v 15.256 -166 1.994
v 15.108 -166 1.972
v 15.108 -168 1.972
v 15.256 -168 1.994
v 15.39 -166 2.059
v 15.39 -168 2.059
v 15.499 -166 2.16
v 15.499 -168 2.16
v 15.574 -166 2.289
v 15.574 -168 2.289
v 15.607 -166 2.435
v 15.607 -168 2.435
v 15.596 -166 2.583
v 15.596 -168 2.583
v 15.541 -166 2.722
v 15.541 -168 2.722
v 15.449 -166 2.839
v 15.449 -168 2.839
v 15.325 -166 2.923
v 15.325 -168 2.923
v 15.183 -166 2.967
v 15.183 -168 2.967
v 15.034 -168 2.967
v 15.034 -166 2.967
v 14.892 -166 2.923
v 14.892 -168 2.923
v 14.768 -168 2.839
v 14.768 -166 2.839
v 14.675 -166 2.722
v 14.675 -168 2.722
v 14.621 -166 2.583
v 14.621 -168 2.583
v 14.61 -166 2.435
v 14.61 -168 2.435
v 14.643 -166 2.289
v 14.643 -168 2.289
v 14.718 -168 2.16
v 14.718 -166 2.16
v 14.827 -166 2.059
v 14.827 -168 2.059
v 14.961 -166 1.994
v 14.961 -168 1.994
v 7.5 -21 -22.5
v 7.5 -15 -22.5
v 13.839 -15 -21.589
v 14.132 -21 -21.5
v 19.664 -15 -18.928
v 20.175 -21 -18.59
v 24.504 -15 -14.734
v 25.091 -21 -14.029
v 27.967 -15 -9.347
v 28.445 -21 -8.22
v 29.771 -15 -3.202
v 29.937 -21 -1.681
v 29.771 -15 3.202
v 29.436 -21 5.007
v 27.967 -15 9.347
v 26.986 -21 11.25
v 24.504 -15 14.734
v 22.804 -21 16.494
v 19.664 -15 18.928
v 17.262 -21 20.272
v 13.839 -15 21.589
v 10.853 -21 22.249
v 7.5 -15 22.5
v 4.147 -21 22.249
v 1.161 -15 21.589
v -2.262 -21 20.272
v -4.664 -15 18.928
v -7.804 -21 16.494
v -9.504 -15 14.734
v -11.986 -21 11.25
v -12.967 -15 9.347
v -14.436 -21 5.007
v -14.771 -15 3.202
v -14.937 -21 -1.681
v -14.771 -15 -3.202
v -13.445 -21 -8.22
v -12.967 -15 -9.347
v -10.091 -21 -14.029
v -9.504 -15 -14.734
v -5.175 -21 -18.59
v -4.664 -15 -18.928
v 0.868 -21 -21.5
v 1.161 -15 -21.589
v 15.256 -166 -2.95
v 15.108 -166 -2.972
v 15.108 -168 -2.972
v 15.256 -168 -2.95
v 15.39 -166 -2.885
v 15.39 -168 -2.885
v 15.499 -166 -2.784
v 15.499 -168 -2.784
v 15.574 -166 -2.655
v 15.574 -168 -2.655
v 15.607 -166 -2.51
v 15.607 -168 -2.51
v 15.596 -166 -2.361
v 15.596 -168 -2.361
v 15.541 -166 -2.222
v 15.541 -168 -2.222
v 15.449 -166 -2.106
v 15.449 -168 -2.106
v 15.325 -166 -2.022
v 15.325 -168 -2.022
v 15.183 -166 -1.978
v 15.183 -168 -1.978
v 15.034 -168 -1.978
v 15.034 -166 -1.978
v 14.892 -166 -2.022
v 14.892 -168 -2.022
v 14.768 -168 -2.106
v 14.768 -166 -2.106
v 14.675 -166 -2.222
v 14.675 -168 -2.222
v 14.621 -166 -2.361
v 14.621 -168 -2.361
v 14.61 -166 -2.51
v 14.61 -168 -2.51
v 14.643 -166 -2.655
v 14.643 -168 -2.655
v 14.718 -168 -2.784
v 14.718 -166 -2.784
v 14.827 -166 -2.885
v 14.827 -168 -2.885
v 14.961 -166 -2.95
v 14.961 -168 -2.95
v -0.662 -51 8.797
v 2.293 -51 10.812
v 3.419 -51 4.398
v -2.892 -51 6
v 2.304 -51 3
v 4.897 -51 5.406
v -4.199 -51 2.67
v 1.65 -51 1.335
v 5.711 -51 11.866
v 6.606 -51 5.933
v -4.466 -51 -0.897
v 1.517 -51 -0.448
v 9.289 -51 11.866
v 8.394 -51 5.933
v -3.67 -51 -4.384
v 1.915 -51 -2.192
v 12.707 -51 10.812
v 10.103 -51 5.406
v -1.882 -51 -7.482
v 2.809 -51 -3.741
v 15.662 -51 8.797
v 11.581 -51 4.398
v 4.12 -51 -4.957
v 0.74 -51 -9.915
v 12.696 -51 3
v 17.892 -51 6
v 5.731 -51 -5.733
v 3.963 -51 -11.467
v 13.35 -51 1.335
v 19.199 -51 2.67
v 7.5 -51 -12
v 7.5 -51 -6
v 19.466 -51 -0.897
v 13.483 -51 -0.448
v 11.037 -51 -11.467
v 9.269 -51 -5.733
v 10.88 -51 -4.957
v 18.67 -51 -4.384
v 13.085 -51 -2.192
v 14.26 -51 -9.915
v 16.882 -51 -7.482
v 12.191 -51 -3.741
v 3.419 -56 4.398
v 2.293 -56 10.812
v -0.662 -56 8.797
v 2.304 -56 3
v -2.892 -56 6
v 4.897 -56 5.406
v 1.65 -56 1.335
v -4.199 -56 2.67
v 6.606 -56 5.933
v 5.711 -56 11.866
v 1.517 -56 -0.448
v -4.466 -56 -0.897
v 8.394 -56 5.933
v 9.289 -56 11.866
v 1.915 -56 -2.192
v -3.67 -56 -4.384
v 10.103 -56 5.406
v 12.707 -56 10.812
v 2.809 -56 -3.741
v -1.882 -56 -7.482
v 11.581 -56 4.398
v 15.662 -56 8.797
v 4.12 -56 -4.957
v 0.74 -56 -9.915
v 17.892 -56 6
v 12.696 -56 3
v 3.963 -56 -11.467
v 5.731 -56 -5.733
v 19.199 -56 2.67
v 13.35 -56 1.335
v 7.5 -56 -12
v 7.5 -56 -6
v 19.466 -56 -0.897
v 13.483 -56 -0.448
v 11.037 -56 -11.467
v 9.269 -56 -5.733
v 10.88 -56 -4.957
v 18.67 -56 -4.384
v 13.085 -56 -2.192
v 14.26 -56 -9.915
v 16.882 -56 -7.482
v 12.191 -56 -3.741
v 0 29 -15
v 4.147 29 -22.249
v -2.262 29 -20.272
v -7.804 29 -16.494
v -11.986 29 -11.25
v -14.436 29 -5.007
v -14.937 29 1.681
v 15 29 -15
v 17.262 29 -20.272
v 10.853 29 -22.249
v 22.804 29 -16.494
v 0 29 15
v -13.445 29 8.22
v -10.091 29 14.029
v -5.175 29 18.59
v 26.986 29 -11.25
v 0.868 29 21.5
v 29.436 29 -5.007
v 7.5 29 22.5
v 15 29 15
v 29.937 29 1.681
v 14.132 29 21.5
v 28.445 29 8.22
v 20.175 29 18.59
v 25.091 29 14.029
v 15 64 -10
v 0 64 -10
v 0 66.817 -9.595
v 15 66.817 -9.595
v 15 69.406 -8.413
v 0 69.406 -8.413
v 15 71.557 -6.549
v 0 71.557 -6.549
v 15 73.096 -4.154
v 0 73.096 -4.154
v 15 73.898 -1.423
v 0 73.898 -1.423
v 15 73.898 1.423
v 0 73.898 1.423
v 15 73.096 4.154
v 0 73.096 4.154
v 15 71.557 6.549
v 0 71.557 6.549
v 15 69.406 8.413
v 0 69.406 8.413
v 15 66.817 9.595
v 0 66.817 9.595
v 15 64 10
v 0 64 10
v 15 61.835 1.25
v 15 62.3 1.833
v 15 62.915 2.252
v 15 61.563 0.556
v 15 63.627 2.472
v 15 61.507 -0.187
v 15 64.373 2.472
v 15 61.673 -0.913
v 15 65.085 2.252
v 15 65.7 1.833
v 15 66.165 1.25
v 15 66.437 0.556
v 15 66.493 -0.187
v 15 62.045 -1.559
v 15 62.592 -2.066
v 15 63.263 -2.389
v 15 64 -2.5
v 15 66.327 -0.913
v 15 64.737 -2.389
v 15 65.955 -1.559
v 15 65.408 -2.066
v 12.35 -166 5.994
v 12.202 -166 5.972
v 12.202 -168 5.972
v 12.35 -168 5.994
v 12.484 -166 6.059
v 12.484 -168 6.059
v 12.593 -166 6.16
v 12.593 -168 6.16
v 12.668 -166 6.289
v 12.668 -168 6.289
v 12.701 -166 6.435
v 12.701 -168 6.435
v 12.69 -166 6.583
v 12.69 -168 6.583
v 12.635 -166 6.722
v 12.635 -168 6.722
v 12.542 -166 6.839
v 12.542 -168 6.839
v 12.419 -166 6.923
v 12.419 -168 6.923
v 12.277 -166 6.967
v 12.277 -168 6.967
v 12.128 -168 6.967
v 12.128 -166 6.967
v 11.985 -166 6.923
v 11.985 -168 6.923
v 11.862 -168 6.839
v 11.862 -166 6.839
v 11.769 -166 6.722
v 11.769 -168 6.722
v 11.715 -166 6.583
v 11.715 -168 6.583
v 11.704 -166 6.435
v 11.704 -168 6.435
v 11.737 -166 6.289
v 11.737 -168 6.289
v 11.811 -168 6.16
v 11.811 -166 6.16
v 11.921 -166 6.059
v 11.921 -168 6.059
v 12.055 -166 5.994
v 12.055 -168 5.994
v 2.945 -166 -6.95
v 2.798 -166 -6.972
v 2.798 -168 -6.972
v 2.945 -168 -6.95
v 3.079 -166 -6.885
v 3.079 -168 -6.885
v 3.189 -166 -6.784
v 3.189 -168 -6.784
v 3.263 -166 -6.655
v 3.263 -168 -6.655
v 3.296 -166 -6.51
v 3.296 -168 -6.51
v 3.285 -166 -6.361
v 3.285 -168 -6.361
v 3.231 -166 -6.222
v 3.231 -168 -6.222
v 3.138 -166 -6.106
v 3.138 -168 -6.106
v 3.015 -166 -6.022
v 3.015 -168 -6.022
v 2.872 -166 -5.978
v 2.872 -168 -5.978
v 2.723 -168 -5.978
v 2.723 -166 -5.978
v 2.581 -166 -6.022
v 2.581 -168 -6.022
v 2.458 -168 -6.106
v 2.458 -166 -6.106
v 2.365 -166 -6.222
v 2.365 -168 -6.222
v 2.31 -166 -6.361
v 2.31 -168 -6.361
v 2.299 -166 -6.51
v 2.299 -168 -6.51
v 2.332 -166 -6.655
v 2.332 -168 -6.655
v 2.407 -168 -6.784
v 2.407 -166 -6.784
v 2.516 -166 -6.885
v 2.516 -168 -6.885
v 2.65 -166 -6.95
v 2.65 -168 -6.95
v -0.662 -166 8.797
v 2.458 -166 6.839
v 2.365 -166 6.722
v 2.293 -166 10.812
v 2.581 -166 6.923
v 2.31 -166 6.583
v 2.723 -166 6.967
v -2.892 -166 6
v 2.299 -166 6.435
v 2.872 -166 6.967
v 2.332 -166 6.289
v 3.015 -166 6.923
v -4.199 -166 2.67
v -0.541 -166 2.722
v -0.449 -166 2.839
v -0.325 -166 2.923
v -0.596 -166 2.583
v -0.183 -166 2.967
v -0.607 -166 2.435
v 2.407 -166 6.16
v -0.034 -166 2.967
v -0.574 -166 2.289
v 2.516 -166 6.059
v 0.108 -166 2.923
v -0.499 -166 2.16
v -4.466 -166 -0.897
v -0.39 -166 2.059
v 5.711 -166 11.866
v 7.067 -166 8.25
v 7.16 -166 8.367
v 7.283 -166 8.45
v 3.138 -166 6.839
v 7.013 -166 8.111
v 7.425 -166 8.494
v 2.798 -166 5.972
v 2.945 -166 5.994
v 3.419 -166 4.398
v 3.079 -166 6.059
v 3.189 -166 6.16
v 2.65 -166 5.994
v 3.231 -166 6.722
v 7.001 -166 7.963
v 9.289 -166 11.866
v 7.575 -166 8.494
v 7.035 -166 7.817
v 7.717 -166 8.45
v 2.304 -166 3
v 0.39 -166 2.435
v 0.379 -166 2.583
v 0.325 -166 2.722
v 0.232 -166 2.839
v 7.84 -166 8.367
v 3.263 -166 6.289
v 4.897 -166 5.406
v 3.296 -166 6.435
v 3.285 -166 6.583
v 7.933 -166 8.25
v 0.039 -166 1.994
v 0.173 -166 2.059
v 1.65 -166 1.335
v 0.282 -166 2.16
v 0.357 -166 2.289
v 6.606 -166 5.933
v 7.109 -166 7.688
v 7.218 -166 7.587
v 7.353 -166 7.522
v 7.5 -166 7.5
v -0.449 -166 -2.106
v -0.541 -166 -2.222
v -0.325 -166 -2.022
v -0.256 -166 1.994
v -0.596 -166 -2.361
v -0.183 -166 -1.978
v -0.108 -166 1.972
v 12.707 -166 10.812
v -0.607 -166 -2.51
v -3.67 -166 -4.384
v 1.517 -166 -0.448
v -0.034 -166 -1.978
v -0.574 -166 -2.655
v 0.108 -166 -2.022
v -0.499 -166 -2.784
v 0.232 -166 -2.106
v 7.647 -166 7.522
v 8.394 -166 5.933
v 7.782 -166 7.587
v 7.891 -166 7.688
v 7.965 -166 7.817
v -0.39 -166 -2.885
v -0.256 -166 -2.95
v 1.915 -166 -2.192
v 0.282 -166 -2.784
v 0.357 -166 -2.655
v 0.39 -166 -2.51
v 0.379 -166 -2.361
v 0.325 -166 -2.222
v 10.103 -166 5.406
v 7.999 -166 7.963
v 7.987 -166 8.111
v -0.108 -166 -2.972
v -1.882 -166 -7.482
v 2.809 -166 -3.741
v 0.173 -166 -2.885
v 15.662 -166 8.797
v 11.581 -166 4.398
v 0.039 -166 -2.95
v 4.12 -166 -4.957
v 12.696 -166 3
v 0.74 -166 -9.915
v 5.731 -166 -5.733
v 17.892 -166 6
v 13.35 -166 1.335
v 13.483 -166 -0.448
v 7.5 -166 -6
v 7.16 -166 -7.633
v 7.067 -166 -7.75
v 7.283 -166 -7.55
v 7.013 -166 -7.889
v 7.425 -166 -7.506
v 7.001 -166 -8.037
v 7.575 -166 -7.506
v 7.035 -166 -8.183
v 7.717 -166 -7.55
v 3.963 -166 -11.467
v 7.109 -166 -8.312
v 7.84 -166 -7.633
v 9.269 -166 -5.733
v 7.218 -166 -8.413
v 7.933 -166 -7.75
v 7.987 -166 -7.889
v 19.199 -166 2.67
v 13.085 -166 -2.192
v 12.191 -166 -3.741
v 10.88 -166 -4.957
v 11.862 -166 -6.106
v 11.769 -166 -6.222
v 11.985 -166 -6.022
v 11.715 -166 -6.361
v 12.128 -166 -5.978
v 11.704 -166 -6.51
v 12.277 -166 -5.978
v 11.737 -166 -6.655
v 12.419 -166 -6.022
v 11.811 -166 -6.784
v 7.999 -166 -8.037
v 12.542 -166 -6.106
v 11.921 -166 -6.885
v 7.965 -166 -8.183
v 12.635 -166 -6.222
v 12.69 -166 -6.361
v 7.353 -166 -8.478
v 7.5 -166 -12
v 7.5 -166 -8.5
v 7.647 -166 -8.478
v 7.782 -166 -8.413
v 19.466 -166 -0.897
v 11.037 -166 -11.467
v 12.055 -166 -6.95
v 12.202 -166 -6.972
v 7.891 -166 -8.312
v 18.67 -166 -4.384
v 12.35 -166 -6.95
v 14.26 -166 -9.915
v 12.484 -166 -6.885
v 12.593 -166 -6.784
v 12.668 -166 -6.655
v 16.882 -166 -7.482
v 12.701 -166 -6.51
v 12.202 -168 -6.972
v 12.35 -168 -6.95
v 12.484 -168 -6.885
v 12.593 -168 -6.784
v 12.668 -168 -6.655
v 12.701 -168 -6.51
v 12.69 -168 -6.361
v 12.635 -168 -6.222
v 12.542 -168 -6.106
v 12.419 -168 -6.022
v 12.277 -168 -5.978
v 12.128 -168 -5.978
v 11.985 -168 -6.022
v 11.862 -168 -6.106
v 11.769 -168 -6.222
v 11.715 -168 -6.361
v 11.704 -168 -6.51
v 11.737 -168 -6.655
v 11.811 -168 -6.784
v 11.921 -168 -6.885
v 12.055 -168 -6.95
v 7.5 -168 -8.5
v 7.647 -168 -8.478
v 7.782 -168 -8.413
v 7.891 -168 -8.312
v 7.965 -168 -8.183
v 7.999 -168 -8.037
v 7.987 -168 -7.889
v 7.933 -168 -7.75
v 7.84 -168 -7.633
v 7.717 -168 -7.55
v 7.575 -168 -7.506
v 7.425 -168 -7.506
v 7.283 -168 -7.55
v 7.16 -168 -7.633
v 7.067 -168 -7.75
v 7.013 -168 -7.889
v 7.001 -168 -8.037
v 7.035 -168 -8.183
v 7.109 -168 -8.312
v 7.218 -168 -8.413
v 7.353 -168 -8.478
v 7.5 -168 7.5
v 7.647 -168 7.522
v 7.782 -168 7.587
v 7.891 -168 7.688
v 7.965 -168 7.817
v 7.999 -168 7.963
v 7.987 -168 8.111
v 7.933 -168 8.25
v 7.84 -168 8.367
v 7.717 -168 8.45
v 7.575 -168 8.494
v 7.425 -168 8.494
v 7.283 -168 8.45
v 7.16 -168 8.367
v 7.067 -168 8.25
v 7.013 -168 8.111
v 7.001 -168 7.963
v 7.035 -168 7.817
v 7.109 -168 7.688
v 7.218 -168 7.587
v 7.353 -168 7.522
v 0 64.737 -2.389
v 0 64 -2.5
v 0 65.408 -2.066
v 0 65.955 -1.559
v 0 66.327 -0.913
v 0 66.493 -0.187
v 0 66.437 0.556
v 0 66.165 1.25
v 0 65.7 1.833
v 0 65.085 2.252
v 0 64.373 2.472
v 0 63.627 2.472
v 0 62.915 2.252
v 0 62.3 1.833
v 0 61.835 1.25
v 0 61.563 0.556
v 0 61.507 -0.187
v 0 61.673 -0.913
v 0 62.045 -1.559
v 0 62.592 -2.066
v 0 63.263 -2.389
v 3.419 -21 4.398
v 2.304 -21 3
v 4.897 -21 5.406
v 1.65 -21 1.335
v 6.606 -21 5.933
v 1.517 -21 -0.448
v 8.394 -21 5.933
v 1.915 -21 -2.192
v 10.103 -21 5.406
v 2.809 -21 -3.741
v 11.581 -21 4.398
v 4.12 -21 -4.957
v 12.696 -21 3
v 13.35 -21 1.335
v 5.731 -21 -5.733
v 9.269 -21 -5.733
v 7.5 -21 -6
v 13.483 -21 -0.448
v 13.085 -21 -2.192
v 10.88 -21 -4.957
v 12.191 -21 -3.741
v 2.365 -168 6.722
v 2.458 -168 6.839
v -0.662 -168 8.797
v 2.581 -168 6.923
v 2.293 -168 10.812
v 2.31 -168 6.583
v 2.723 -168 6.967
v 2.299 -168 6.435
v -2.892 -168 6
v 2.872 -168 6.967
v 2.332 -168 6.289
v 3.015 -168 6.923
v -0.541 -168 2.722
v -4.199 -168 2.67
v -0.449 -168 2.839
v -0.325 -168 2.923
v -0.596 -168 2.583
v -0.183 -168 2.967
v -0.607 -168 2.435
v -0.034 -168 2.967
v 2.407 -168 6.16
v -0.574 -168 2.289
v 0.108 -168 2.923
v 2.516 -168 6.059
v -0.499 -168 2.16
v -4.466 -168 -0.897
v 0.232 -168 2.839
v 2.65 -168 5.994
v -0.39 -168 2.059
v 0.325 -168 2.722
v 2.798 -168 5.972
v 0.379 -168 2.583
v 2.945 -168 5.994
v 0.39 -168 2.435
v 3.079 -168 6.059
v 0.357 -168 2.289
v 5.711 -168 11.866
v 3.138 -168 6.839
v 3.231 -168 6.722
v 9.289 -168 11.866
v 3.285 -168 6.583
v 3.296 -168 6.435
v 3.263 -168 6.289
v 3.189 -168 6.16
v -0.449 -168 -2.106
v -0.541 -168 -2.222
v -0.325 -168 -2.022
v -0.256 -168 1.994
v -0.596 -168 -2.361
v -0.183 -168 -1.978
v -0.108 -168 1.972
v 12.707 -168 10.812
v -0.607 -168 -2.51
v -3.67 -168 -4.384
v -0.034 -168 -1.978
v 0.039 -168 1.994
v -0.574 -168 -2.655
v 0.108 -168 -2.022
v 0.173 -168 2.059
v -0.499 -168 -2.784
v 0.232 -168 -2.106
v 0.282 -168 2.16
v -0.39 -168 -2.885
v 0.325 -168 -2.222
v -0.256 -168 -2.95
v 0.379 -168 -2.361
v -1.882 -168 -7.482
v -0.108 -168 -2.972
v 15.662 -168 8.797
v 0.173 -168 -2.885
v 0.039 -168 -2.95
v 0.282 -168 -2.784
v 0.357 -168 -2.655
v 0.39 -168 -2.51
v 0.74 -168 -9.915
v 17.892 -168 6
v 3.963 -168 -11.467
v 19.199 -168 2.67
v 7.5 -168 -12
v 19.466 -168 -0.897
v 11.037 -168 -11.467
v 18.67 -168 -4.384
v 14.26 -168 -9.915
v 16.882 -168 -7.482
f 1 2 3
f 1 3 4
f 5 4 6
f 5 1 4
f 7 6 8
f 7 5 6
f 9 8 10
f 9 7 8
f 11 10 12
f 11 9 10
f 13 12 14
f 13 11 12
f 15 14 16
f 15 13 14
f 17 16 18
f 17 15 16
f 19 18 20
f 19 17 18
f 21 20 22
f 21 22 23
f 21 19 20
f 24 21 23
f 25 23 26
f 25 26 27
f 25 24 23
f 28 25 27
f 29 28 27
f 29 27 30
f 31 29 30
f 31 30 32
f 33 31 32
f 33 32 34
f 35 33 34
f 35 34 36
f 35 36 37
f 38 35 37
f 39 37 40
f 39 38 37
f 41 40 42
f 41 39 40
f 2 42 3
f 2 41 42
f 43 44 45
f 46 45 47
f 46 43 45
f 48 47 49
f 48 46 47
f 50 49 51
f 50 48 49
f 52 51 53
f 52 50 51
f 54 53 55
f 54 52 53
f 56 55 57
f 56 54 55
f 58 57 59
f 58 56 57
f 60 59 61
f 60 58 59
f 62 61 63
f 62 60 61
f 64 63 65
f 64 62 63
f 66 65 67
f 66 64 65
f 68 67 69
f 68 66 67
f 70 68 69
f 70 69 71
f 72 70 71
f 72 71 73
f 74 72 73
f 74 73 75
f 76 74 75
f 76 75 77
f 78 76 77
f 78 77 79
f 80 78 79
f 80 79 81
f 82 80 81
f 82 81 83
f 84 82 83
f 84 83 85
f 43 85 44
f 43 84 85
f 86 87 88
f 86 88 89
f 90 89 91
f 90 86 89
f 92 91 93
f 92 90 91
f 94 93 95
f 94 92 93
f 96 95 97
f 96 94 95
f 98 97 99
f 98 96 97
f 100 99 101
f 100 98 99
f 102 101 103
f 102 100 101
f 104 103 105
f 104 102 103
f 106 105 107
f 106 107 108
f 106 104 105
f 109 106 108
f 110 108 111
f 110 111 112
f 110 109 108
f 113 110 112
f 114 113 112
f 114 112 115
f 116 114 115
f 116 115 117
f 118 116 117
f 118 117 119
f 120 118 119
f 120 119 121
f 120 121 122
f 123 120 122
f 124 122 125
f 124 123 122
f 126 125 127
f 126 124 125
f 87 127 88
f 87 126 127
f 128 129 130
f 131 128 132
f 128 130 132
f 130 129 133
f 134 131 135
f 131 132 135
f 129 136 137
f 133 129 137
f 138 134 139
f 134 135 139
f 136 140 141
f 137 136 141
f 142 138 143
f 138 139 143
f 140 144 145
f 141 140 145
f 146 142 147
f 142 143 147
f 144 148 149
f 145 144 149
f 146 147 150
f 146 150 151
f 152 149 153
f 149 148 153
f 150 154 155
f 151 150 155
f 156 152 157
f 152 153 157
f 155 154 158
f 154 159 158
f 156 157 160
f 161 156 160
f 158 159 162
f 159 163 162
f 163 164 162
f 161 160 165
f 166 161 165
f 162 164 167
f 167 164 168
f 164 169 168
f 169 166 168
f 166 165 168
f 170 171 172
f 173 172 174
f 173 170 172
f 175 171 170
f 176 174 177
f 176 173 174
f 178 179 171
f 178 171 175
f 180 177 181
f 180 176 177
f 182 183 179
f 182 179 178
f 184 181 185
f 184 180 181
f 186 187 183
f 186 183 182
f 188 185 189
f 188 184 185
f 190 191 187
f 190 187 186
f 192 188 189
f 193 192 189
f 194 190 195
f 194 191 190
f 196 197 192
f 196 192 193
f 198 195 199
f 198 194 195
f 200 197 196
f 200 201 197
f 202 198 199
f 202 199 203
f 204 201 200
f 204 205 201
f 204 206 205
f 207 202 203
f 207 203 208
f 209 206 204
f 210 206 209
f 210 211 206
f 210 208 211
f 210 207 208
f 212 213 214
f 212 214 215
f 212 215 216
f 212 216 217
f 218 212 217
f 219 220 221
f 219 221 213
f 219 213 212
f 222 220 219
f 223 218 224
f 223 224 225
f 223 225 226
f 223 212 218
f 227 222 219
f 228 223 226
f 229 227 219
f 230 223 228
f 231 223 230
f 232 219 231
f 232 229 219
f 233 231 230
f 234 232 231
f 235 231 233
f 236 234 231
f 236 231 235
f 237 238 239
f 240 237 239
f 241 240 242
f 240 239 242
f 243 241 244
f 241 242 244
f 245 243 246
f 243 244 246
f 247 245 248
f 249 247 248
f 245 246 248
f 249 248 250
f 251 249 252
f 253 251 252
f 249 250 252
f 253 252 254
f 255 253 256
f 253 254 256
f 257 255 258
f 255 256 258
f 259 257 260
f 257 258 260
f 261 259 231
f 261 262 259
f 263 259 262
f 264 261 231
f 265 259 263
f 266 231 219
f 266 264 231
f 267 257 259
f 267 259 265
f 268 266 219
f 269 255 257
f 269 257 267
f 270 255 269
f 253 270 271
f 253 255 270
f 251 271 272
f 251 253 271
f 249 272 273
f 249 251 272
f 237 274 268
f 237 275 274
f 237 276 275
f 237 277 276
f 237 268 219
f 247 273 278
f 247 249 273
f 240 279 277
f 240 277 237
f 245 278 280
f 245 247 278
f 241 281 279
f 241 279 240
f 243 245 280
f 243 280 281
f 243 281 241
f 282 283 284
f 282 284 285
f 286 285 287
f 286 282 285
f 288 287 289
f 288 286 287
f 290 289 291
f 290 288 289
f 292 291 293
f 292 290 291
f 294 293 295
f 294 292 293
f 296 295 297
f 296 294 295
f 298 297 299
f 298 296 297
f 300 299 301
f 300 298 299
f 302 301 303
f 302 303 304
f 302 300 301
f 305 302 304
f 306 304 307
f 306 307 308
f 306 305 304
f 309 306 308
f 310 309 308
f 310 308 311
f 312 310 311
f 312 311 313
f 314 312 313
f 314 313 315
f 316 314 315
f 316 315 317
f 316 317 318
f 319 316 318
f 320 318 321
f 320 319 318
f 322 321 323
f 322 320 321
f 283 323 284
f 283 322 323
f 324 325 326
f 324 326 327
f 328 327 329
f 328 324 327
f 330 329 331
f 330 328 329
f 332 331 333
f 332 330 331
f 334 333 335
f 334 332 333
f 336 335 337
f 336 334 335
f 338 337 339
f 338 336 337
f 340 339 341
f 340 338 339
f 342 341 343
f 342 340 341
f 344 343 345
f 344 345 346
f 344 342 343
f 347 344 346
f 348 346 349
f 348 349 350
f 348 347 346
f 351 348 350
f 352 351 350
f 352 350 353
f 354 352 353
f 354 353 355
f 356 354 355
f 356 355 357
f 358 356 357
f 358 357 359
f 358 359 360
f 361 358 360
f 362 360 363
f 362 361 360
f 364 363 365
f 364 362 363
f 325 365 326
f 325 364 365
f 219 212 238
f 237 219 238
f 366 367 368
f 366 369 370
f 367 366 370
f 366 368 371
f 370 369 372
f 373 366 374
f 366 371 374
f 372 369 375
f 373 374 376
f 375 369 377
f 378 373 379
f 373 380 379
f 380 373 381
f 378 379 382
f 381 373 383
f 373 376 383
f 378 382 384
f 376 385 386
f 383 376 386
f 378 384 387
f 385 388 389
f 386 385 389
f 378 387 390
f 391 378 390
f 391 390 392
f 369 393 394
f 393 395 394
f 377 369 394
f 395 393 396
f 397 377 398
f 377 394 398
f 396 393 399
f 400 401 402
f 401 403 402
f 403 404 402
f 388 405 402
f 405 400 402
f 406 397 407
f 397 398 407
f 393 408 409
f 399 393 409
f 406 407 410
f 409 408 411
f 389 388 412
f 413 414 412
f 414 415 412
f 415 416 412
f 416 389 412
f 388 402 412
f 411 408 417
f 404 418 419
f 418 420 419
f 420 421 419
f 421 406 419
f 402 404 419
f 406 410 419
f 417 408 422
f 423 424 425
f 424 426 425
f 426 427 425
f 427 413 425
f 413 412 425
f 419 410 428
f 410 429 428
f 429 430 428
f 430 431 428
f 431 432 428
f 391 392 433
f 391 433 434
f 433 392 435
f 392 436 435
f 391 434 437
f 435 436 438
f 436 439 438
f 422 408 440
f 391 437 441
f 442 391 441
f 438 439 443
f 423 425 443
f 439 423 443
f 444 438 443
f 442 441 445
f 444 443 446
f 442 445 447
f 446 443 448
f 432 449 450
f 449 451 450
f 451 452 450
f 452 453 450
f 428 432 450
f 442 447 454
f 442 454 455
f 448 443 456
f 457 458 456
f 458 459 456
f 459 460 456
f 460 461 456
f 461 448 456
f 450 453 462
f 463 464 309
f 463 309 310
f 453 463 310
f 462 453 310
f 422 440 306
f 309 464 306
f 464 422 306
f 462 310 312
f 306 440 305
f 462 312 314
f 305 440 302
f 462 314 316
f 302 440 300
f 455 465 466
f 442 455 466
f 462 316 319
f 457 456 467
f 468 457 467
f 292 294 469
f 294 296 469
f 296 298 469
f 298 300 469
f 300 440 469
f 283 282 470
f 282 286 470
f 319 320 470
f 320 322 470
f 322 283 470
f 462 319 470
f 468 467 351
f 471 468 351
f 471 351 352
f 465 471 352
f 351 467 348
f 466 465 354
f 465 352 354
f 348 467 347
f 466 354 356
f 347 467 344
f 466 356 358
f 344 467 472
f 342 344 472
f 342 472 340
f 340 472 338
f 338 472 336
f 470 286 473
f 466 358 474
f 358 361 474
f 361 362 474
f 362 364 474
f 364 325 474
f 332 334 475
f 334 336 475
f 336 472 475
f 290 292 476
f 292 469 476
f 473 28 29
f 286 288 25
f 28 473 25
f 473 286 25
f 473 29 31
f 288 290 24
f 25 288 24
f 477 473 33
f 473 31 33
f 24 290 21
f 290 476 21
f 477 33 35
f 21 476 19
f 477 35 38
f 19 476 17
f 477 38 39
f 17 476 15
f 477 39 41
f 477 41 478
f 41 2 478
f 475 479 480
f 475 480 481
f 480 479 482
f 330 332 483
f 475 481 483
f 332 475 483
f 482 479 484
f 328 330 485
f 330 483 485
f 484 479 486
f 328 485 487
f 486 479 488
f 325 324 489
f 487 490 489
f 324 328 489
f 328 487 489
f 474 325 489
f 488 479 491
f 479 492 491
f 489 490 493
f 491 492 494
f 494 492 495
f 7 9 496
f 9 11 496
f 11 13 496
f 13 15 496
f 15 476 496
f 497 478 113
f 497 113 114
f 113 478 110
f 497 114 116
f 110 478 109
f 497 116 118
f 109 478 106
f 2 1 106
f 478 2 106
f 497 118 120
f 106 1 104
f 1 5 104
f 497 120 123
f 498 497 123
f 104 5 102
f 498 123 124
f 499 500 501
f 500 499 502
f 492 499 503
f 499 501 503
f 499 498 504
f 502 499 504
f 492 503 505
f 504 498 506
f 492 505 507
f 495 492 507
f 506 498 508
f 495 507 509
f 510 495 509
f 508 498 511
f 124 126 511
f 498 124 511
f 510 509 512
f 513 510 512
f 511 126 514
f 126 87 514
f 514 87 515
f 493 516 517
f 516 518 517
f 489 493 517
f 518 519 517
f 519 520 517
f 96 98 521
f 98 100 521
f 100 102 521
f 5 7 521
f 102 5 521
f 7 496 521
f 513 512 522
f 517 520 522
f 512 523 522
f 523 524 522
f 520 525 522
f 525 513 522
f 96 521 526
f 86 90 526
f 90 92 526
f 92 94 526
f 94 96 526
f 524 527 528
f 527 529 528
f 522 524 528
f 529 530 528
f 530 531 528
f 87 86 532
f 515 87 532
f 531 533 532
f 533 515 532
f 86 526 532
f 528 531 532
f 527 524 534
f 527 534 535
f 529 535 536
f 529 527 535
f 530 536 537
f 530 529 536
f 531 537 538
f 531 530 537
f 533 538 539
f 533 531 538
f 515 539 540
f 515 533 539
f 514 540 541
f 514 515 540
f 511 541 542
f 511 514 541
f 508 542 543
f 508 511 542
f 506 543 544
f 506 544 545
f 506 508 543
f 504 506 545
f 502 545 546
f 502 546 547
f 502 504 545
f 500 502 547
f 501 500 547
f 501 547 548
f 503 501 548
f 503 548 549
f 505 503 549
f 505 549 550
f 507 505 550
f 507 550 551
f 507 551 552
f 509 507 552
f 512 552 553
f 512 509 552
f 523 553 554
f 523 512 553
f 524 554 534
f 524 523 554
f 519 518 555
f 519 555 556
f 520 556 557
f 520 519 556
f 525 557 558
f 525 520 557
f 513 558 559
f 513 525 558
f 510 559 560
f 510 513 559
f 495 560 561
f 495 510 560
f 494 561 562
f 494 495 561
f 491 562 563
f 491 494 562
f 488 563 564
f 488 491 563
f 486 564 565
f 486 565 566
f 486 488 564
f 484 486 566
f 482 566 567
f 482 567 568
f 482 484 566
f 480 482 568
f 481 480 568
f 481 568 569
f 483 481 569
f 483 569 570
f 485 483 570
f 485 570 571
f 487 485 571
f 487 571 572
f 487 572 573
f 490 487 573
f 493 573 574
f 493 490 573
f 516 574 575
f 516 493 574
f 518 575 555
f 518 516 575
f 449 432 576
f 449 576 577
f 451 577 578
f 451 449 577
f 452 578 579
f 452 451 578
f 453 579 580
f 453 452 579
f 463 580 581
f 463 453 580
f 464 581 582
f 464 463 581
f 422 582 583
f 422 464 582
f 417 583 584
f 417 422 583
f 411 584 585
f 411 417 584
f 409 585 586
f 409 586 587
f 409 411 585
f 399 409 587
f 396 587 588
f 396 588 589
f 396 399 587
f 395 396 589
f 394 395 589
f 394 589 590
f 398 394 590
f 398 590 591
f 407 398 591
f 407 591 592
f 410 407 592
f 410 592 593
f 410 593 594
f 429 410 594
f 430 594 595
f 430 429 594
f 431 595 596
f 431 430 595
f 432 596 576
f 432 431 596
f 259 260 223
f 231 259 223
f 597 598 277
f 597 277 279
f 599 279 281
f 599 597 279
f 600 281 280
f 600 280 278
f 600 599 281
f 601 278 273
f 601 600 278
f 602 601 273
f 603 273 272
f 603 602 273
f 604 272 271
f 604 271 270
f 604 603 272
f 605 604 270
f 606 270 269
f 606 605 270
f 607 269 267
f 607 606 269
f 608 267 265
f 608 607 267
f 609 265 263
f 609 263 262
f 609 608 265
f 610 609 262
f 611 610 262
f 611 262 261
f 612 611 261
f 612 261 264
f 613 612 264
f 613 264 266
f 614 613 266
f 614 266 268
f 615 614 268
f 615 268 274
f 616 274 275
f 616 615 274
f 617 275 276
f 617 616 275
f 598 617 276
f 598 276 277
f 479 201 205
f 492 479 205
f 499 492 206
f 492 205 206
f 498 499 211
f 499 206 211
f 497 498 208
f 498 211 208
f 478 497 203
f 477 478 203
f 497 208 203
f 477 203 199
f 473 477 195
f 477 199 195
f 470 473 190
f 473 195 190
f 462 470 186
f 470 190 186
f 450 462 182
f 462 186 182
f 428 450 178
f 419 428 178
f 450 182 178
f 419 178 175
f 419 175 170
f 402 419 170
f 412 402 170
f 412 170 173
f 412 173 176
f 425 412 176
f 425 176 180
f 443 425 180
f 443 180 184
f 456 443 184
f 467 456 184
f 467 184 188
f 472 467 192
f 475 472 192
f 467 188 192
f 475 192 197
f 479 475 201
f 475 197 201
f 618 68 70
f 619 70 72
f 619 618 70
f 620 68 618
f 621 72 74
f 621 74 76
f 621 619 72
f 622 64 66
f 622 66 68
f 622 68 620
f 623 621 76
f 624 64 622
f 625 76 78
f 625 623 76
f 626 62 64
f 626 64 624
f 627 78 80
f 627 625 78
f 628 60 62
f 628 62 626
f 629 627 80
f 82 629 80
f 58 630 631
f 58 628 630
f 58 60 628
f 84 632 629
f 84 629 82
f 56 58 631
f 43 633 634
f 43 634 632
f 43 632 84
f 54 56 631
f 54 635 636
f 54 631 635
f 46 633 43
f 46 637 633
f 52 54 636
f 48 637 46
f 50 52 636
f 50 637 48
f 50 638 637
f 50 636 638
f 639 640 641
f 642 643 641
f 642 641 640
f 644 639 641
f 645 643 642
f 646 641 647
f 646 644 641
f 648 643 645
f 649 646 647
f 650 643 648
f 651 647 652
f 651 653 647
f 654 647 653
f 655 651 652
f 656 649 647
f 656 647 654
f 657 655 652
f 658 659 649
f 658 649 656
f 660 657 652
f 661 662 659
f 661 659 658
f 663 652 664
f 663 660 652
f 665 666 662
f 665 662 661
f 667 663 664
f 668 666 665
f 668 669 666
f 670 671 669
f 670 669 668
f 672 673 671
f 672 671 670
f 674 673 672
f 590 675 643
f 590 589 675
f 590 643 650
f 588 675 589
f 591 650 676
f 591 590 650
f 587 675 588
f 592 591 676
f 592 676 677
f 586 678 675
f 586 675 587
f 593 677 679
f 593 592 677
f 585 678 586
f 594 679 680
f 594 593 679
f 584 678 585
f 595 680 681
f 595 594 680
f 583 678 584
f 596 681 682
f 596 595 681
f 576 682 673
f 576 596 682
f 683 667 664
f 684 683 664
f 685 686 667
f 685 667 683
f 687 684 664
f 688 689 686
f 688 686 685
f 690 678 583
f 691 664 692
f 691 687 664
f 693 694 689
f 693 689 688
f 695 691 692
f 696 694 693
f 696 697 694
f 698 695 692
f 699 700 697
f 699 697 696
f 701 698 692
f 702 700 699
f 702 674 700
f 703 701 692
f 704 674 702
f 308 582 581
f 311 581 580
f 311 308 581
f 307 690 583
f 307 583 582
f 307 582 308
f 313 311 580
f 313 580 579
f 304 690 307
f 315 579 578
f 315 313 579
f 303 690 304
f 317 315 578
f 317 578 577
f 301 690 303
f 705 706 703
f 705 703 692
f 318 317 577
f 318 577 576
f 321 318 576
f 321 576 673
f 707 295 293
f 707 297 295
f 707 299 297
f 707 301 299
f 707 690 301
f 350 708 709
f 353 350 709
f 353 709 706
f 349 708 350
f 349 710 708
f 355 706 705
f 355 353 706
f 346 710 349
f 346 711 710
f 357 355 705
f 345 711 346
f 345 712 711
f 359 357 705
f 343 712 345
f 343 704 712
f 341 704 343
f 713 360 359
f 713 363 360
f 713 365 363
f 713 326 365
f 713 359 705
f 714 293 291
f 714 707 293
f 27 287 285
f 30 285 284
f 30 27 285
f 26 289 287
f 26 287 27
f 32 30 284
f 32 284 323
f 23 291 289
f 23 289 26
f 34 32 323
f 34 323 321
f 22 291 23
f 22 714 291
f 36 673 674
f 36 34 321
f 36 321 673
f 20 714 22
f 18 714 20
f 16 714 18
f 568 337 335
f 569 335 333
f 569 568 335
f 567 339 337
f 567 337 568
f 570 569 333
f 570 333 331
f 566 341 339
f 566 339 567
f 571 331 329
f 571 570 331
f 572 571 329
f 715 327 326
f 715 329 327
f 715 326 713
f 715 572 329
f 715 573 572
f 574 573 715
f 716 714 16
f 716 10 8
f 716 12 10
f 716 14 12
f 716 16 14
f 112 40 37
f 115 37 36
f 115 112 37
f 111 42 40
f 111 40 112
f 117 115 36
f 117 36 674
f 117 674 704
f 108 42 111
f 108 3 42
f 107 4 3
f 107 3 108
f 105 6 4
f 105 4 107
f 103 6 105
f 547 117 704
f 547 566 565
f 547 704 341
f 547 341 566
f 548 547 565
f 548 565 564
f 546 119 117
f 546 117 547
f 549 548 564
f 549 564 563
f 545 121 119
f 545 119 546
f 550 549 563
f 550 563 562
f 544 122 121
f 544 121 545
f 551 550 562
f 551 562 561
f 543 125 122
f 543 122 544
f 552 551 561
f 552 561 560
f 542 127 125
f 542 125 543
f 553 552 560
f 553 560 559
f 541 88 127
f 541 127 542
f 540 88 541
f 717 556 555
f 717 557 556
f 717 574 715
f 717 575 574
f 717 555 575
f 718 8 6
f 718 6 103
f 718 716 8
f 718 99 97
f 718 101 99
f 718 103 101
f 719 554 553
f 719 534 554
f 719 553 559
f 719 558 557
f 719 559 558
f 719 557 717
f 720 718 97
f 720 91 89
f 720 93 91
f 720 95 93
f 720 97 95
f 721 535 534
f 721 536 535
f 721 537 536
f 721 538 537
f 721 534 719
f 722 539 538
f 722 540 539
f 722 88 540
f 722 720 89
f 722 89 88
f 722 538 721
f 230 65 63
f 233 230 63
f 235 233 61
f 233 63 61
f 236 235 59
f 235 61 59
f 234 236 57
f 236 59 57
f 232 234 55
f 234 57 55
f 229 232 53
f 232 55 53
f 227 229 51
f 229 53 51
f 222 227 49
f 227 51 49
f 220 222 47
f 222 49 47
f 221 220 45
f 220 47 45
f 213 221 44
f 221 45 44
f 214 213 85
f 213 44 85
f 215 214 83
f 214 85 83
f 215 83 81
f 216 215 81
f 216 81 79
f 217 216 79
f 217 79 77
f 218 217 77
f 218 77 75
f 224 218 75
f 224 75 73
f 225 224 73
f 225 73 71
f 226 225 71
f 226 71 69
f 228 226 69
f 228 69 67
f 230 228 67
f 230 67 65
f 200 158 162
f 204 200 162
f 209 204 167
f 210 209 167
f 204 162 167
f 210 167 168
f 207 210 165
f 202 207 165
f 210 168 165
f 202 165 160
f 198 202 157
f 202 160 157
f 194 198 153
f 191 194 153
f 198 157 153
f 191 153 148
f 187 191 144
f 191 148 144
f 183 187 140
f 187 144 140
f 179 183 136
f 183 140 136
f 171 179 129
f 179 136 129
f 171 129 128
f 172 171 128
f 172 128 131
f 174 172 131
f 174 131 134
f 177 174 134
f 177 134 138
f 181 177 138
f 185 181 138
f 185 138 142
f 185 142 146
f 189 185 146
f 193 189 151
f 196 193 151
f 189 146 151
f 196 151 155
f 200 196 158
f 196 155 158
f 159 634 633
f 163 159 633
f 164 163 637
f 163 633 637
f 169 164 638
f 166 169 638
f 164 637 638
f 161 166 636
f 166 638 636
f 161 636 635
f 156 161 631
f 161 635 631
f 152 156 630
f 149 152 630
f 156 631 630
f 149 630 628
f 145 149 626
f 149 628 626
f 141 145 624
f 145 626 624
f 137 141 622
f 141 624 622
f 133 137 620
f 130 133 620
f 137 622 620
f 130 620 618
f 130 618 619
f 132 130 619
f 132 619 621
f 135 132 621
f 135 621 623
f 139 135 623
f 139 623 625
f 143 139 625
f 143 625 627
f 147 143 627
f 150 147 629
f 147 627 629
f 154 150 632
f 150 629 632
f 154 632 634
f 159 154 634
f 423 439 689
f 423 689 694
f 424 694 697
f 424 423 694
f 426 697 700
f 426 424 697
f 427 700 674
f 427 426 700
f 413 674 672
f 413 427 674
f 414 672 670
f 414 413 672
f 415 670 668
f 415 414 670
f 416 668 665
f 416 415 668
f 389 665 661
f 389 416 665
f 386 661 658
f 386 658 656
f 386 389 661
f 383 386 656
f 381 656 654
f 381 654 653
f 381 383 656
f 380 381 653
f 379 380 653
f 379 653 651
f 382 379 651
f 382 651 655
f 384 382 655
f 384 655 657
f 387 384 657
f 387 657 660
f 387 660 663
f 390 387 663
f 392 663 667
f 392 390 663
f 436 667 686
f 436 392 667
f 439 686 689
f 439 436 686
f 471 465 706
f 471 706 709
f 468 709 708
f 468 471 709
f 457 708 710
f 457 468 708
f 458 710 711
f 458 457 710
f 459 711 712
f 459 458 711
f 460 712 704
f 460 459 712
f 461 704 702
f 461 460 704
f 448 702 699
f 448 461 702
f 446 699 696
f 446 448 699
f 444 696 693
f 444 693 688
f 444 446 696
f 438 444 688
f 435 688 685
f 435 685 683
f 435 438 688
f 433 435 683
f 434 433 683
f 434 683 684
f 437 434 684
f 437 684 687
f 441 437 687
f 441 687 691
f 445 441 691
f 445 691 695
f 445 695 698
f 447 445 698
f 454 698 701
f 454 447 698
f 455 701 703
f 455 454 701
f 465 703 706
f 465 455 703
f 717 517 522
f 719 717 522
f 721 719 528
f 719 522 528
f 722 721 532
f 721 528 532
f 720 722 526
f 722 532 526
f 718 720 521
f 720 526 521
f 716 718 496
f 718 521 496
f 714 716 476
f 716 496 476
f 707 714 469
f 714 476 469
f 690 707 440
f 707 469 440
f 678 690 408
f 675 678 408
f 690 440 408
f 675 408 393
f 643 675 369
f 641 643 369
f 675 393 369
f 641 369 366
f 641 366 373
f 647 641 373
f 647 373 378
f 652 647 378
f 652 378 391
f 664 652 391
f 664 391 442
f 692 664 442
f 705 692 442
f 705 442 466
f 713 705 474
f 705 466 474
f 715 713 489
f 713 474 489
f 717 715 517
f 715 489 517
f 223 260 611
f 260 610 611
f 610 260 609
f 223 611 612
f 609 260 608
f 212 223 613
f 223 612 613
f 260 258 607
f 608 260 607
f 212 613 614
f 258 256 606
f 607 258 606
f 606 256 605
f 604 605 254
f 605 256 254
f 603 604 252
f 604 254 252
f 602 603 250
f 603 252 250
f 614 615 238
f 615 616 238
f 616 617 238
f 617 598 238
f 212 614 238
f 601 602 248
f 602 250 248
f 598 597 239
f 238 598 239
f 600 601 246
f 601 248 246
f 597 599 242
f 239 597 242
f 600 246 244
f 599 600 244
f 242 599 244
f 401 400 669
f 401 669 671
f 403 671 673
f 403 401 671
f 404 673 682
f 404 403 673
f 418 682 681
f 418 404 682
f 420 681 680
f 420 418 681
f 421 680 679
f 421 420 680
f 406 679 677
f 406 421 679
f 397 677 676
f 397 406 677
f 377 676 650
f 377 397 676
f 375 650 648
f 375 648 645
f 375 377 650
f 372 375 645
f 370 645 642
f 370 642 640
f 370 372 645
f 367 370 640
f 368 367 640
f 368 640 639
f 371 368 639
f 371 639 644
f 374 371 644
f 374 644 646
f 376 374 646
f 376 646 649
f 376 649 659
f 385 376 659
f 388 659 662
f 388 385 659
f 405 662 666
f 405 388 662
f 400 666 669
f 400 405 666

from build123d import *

# Parameters (mm, degrees)
SKETCH2_R            = 2.5
BOSS_EXTRUDE2_DEPTH  = 15
SKETCH3_R            = 22.5
BOSS_EXTRUDE16_DEPTH = 39
BOSS_EXTRUDE22_START = -5
SKETCH3_4_R          = 22.5
BOSS_EXTRUDE22_DEPTH = 5
BOSS_EXTRUDE23_START = 6
SKETCH7_R            = 22.5
BOSS_EXTRUDE23_DEPTH = 6
SKETCH8_R            = 6
BOSS_EXTRUDE25_DEPTH = 30
SKETCH9_R            = 12
BOSS_EXTRUDE27_DEPTH = 5
SKETCH10_R           = 6
BOSS_EXTRUDE28_DEPTH = 110
SKETCH11_R           = 12
SKETCH11_R_2         = 0.5
BOSS_EXTRUDE30_DEPTH = 2


with BuildPart() as part:
    # Sketch2 → Boss-Extrude2 (new body)
    with BuildSketch(Plane(origin=(0, 0, 0), x_dir=(0, 0, -1), z_dir=(1, 0, 0))):
        with BuildLine():
            Line((-10, 64), (-15, 29))
            Line((-15, 29), (15, 29))
            Line((15, 29), (10, 64))
            ThreePointArc((10, 64), (0, 74), (-10, 64))
        make_face()
        with Locations((0, 64)):
            Circle(SKETCH2_R, mode=Mode.SUBTRACT)
    extrude(amount=BOSS_EXTRUDE2_DEPTH)

    # Sketch3 → Boss-Extrude16 (add)
    with BuildSketch(Plane(origin=(0, -10, 0), x_dir=(1, 0, 0), z_dir=(0, 1, 0))):
        with Locations(Location((7.5, 0, 0), (0, 0, 270))):
            Circle(SKETCH3_R)
    extrude(amount=BOSS_EXTRUDE16_DEPTH)

    # Sketch3<4> → Boss-Extrude22 (add)
    with BuildSketch(Plane(origin=(0, -10, 0), x_dir=(1, 0, 0), z_dir=(0, 1, 0)).offset(BOSS_EXTRUDE22_START)):
        with Locations(Location((7.5, 0, 0), (0, 0, 270))):
            Circle(SKETCH3_4_R)
    extrude(amount=BOSS_EXTRUDE22_DEPTH)

    # Sketch7 → Boss-Extrude23 (add)
    with BuildSketch(Plane.XZ.offset(15).offset(BOSS_EXTRUDE23_START)):
        with Locations(Location((7.5, 0, 0), (0, 0, 270))):
            Circle(SKETCH7_R)
    extrude(amount=-BOSS_EXTRUDE23_DEPTH)

    # Sketch8 → Boss-Extrude25 (add)
    with BuildSketch(Plane.XZ.offset(21)):
        with Locations(Location((7.5, 0, 0), (0, 0, 270))):
            Circle(SKETCH8_R)
    extrude(amount=BOSS_EXTRUDE25_DEPTH)

    # Sketch9 → Boss-Extrude27 (add)
    with BuildSketch(Plane.XZ.offset(51)):
        with Locations(Location((7.5, 0, 0), (0, 0, 270))):
            Circle(SKETCH9_R)
    extrude(amount=BOSS_EXTRUDE27_DEPTH)

    # Sketch10 → Boss-Extrude28 (add)
    with BuildSketch(Plane.XZ.offset(56)):
        with Locations(Location((7.5, 0, 0), (0, 0, 270))):
            Circle(SKETCH10_R)
    extrude(amount=BOSS_EXTRUDE28_DEPTH)

    # Sketch11 → Boss-Extrude30 (add)
    with BuildSketch(Plane.XZ.offset(166)):
        with Locations(Location((7.5, 0, 0), (0, 0, 270))):
            Circle(SKETCH11_R)
        with Locations(Location((7.5, 8, 0), (0, 0, 270))):
            Circle(SKETCH11_R_2, mode=Mode.SUBTRACT)
        with Locations(Location((2.797717982, 6.472135955, 0), (0, 0, 270))):
            Circle(SKETCH11_R_2, mode=Mode.SUBTRACT)
        with Locations(Location((-0.10845213, 2.472135955, 0), (0, 0, 270))):
            Circle(SKETCH11_R_2, mode=Mode.SUBTRACT)
        with Locations(Location((2.797717982, -6.472135955, 0), (0, 0, 270))):
            Circle(SKETCH11_R_2, mode=Mode.SUBTRACT)
        with Locations(Location((-0.10845213, -2.472135955, 0), (0, 0, 270))):
            Circle(SKETCH11_R_2, mode=Mode.SUBTRACT)
        with Locations(Location((7.5, -8, 0), (0, 0, 270))):
            Circle(SKETCH11_R_2, mode=Mode.SUBTRACT)
        with Locations(Location((12.202282018, -6.472135955, 0), (0, 0, 270))):
            Circle(SKETCH11_R_2, mode=Mode.SUBTRACT)
        with Locations(Location((15.10845213, -2.472135955, 0), (0, 0, 270))):
            Circle(SKETCH11_R_2, mode=Mode.SUBTRACT)
        with Locations(Location((15.10845213, 2.472135955, 0), (0, 0, 270))):
            Circle(SKETCH11_R_2, mode=Mode.SUBTRACT)
        with Locations(Location((12.202282018, 6.472135955, 0), (0, 0, 270))):
            Circle(SKETCH11_R_2, mode=Mode.SUBTRACT)
    extrude(amount=BOSS_EXTRUDE30_DEPTH)


solid = part.part
